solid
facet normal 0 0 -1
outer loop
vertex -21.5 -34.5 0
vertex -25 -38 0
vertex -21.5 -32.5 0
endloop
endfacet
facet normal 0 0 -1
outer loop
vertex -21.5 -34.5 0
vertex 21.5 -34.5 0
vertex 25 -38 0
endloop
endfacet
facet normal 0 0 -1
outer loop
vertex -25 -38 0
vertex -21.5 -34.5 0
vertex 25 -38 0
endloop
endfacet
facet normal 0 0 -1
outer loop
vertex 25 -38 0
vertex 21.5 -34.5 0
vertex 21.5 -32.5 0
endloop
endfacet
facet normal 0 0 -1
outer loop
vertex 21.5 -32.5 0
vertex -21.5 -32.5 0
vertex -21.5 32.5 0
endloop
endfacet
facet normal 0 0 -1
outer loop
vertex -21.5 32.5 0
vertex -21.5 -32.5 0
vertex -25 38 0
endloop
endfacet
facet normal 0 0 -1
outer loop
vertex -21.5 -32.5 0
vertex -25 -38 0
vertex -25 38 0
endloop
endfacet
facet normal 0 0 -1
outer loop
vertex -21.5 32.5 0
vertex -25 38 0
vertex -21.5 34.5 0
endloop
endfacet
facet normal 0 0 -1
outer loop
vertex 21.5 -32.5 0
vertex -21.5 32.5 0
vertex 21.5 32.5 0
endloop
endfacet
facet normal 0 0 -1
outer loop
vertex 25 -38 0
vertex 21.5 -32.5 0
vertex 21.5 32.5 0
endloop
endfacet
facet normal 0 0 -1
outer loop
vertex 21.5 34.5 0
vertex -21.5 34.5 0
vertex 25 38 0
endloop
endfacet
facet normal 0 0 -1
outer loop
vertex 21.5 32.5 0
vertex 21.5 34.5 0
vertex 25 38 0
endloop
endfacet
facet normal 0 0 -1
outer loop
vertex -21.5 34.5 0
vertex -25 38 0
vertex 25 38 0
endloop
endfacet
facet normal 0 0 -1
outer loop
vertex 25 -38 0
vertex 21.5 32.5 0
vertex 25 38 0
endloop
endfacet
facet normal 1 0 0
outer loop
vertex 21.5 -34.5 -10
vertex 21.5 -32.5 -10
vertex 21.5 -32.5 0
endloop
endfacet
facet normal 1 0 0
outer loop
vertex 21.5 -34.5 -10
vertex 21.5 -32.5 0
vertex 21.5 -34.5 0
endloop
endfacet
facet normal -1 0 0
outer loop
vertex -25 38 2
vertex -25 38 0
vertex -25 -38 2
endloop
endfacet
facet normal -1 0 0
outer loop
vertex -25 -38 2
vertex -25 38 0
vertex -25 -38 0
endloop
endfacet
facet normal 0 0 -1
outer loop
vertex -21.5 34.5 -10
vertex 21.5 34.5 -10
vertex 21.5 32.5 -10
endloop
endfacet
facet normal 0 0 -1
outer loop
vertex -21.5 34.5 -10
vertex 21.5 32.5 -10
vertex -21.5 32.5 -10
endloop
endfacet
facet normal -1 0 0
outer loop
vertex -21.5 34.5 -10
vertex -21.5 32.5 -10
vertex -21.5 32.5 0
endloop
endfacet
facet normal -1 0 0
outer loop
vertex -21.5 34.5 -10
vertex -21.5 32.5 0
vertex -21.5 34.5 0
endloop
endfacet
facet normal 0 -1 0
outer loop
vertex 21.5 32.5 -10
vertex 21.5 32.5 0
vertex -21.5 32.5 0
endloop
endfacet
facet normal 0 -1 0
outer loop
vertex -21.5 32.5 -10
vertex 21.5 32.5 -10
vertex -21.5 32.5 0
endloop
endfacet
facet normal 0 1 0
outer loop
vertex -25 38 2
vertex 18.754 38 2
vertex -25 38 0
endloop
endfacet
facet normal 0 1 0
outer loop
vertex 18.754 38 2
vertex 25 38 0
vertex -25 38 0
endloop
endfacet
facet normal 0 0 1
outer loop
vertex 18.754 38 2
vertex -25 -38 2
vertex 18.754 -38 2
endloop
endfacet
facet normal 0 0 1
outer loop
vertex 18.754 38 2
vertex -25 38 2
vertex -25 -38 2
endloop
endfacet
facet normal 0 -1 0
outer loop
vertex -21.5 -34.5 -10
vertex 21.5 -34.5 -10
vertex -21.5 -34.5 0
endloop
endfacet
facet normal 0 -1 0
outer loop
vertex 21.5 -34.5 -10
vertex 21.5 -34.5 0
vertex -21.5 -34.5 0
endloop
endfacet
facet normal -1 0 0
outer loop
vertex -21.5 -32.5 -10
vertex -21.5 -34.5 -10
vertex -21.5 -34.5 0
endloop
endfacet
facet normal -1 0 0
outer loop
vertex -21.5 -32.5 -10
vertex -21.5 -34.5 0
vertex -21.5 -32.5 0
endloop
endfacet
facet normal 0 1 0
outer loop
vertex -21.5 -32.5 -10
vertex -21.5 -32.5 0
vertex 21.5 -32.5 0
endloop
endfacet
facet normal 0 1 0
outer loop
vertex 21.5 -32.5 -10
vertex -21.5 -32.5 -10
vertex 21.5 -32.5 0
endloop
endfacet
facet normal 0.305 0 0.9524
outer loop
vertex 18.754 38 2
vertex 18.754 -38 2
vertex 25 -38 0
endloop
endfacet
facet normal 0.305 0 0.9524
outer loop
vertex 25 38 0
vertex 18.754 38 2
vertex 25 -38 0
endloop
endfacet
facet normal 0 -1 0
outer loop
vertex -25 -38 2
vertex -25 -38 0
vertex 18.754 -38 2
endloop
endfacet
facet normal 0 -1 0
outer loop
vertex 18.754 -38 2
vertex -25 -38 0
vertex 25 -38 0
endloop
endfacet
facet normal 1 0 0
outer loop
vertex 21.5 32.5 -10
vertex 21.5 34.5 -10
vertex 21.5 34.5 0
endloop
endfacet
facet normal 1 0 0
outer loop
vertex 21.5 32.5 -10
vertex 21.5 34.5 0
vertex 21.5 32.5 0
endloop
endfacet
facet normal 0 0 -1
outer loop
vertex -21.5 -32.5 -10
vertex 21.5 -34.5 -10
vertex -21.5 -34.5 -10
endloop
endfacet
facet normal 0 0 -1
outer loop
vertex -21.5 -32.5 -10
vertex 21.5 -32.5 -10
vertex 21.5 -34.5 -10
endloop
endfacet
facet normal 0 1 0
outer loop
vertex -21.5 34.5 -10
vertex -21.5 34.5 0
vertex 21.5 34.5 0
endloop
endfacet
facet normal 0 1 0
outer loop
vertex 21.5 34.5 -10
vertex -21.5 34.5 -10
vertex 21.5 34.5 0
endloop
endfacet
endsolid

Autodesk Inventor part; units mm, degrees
ref_plane "YZ Plane" through (0, 0, 0) normal (1, 0, 0) x (0, 1, 0)
ref_plane "XZ Plane" through (0, 0, 0) normal (0, 1, 0) x (-1, 0, 0)
ref_plane "XY Plane" through (0, 0, 0) normal (0, 0, 1) x (1, 0, 0)
sketch "Sketch1" plane through (0, 0, 0) normal (0, 0, 1) x (1, 0, 0)
  line L0 (-22, 35) -> (22, 35) projected
  line L1 (22, 35) -> (22, -35) projected
  line L2 (22, -35) -> (-22, -35) projected
  line L3 (-25, -38) -> (25, -38) projected
  line L4 (25, -38) -> (25, 38) projected
  line L5 (25, 38) -> (-25, 38) projected
  line L6 (-25, 38) -> (-25, -38) projected
  line L7 (-22, -6.5359) -> (-22, 6.5359) projected
  arc A0 (-22, -6.5359) -> (-22, -13.4641) centre (-20, -10) ccw projected
  arc A1 (-22, 13.4641) -> (-22, 6.5359) centre (-20, 10) ccw projected
  line L8 (-22, 13.4641) -> (-22, 35) projected
  line L9 (-22, -35) -> (-22, -13.4641) projected
  point P0 (0, 0)
extrude "Extrusion1" add sketch "Sketch1" along normal blind 2 contours L0 L1 L2 L9 A0 L7 A1 L8 | L6 L5 L4 L3
sketch "Sketch2" plane through (-25, -38, 0) normal (0, -1, 0) x (1, 0, 0)
  line L0 (50, 0) -> (103.092, -17) construction
  line L1 (43.7539, 2) -> (50, 0)
  line L2 (0, 2) -> (50, 2) construction
  line L3 (50, 0) -> (50, 2) projected
  line L4 (43.7539, 2) -> (50, 2)
  line L5 (50, 2) -> (50, 0)
  point P0 (25, 0)
extrude "Extrusion2" cut sketch "Sketch2" against normal through all
sketch "Sketch3" plane through (0, 0, 0) normal (0, 0, -1) x (-1, 0, 0)
  line L0 (-22, -35) -> (22, -35) projected
  line L1 (22, 35) -> (-22, 35) projected
  line L2 (-22, 35) -> (-22, -35) projected
  line L3 (22, -35) -> (22, -13.4641) projected
  line L4 (22, 13.4641) -> (22, 35) projected
  line L5 (-21.5, -34.5) -> (21.5, -34.5)
  line L6 (21.5, -34.5) -> (21.5, -32.5)
  line L7 (21.5, -32.5) -> (-21.5, -32.5)
  line L8 (-21.5, -32.5) -> (-21.5, -34.5)
  line L9 (-21.5, 32.5) -> (21.5, 32.5)
  line L10 (21.5, 32.5) -> (21.5, 34.5)
  line L11 (21.5, 34.5) -> (-21.5, 34.5)
  line L12 (-21.5, 34.5) -> (-21.5, 32.5)
  point P0 (0, 0)
  dimension "d4" = 0.5
  dimension "d5" = 0.5
  dimension "d6" = 0.5
  dimension "d8" = 0.5
  dimension "d9" = 2
  dimension "d10" = 2
extrude "Extrusion3" add sketch "Sketch3" along normal blind 10
equation "\"d5\" = d4"
equation "\"d6\" = d4"
equation "\"d8\" = d4"
equation "\"d10\" = d9"
properties part number "cover2" material "Ogólne"
